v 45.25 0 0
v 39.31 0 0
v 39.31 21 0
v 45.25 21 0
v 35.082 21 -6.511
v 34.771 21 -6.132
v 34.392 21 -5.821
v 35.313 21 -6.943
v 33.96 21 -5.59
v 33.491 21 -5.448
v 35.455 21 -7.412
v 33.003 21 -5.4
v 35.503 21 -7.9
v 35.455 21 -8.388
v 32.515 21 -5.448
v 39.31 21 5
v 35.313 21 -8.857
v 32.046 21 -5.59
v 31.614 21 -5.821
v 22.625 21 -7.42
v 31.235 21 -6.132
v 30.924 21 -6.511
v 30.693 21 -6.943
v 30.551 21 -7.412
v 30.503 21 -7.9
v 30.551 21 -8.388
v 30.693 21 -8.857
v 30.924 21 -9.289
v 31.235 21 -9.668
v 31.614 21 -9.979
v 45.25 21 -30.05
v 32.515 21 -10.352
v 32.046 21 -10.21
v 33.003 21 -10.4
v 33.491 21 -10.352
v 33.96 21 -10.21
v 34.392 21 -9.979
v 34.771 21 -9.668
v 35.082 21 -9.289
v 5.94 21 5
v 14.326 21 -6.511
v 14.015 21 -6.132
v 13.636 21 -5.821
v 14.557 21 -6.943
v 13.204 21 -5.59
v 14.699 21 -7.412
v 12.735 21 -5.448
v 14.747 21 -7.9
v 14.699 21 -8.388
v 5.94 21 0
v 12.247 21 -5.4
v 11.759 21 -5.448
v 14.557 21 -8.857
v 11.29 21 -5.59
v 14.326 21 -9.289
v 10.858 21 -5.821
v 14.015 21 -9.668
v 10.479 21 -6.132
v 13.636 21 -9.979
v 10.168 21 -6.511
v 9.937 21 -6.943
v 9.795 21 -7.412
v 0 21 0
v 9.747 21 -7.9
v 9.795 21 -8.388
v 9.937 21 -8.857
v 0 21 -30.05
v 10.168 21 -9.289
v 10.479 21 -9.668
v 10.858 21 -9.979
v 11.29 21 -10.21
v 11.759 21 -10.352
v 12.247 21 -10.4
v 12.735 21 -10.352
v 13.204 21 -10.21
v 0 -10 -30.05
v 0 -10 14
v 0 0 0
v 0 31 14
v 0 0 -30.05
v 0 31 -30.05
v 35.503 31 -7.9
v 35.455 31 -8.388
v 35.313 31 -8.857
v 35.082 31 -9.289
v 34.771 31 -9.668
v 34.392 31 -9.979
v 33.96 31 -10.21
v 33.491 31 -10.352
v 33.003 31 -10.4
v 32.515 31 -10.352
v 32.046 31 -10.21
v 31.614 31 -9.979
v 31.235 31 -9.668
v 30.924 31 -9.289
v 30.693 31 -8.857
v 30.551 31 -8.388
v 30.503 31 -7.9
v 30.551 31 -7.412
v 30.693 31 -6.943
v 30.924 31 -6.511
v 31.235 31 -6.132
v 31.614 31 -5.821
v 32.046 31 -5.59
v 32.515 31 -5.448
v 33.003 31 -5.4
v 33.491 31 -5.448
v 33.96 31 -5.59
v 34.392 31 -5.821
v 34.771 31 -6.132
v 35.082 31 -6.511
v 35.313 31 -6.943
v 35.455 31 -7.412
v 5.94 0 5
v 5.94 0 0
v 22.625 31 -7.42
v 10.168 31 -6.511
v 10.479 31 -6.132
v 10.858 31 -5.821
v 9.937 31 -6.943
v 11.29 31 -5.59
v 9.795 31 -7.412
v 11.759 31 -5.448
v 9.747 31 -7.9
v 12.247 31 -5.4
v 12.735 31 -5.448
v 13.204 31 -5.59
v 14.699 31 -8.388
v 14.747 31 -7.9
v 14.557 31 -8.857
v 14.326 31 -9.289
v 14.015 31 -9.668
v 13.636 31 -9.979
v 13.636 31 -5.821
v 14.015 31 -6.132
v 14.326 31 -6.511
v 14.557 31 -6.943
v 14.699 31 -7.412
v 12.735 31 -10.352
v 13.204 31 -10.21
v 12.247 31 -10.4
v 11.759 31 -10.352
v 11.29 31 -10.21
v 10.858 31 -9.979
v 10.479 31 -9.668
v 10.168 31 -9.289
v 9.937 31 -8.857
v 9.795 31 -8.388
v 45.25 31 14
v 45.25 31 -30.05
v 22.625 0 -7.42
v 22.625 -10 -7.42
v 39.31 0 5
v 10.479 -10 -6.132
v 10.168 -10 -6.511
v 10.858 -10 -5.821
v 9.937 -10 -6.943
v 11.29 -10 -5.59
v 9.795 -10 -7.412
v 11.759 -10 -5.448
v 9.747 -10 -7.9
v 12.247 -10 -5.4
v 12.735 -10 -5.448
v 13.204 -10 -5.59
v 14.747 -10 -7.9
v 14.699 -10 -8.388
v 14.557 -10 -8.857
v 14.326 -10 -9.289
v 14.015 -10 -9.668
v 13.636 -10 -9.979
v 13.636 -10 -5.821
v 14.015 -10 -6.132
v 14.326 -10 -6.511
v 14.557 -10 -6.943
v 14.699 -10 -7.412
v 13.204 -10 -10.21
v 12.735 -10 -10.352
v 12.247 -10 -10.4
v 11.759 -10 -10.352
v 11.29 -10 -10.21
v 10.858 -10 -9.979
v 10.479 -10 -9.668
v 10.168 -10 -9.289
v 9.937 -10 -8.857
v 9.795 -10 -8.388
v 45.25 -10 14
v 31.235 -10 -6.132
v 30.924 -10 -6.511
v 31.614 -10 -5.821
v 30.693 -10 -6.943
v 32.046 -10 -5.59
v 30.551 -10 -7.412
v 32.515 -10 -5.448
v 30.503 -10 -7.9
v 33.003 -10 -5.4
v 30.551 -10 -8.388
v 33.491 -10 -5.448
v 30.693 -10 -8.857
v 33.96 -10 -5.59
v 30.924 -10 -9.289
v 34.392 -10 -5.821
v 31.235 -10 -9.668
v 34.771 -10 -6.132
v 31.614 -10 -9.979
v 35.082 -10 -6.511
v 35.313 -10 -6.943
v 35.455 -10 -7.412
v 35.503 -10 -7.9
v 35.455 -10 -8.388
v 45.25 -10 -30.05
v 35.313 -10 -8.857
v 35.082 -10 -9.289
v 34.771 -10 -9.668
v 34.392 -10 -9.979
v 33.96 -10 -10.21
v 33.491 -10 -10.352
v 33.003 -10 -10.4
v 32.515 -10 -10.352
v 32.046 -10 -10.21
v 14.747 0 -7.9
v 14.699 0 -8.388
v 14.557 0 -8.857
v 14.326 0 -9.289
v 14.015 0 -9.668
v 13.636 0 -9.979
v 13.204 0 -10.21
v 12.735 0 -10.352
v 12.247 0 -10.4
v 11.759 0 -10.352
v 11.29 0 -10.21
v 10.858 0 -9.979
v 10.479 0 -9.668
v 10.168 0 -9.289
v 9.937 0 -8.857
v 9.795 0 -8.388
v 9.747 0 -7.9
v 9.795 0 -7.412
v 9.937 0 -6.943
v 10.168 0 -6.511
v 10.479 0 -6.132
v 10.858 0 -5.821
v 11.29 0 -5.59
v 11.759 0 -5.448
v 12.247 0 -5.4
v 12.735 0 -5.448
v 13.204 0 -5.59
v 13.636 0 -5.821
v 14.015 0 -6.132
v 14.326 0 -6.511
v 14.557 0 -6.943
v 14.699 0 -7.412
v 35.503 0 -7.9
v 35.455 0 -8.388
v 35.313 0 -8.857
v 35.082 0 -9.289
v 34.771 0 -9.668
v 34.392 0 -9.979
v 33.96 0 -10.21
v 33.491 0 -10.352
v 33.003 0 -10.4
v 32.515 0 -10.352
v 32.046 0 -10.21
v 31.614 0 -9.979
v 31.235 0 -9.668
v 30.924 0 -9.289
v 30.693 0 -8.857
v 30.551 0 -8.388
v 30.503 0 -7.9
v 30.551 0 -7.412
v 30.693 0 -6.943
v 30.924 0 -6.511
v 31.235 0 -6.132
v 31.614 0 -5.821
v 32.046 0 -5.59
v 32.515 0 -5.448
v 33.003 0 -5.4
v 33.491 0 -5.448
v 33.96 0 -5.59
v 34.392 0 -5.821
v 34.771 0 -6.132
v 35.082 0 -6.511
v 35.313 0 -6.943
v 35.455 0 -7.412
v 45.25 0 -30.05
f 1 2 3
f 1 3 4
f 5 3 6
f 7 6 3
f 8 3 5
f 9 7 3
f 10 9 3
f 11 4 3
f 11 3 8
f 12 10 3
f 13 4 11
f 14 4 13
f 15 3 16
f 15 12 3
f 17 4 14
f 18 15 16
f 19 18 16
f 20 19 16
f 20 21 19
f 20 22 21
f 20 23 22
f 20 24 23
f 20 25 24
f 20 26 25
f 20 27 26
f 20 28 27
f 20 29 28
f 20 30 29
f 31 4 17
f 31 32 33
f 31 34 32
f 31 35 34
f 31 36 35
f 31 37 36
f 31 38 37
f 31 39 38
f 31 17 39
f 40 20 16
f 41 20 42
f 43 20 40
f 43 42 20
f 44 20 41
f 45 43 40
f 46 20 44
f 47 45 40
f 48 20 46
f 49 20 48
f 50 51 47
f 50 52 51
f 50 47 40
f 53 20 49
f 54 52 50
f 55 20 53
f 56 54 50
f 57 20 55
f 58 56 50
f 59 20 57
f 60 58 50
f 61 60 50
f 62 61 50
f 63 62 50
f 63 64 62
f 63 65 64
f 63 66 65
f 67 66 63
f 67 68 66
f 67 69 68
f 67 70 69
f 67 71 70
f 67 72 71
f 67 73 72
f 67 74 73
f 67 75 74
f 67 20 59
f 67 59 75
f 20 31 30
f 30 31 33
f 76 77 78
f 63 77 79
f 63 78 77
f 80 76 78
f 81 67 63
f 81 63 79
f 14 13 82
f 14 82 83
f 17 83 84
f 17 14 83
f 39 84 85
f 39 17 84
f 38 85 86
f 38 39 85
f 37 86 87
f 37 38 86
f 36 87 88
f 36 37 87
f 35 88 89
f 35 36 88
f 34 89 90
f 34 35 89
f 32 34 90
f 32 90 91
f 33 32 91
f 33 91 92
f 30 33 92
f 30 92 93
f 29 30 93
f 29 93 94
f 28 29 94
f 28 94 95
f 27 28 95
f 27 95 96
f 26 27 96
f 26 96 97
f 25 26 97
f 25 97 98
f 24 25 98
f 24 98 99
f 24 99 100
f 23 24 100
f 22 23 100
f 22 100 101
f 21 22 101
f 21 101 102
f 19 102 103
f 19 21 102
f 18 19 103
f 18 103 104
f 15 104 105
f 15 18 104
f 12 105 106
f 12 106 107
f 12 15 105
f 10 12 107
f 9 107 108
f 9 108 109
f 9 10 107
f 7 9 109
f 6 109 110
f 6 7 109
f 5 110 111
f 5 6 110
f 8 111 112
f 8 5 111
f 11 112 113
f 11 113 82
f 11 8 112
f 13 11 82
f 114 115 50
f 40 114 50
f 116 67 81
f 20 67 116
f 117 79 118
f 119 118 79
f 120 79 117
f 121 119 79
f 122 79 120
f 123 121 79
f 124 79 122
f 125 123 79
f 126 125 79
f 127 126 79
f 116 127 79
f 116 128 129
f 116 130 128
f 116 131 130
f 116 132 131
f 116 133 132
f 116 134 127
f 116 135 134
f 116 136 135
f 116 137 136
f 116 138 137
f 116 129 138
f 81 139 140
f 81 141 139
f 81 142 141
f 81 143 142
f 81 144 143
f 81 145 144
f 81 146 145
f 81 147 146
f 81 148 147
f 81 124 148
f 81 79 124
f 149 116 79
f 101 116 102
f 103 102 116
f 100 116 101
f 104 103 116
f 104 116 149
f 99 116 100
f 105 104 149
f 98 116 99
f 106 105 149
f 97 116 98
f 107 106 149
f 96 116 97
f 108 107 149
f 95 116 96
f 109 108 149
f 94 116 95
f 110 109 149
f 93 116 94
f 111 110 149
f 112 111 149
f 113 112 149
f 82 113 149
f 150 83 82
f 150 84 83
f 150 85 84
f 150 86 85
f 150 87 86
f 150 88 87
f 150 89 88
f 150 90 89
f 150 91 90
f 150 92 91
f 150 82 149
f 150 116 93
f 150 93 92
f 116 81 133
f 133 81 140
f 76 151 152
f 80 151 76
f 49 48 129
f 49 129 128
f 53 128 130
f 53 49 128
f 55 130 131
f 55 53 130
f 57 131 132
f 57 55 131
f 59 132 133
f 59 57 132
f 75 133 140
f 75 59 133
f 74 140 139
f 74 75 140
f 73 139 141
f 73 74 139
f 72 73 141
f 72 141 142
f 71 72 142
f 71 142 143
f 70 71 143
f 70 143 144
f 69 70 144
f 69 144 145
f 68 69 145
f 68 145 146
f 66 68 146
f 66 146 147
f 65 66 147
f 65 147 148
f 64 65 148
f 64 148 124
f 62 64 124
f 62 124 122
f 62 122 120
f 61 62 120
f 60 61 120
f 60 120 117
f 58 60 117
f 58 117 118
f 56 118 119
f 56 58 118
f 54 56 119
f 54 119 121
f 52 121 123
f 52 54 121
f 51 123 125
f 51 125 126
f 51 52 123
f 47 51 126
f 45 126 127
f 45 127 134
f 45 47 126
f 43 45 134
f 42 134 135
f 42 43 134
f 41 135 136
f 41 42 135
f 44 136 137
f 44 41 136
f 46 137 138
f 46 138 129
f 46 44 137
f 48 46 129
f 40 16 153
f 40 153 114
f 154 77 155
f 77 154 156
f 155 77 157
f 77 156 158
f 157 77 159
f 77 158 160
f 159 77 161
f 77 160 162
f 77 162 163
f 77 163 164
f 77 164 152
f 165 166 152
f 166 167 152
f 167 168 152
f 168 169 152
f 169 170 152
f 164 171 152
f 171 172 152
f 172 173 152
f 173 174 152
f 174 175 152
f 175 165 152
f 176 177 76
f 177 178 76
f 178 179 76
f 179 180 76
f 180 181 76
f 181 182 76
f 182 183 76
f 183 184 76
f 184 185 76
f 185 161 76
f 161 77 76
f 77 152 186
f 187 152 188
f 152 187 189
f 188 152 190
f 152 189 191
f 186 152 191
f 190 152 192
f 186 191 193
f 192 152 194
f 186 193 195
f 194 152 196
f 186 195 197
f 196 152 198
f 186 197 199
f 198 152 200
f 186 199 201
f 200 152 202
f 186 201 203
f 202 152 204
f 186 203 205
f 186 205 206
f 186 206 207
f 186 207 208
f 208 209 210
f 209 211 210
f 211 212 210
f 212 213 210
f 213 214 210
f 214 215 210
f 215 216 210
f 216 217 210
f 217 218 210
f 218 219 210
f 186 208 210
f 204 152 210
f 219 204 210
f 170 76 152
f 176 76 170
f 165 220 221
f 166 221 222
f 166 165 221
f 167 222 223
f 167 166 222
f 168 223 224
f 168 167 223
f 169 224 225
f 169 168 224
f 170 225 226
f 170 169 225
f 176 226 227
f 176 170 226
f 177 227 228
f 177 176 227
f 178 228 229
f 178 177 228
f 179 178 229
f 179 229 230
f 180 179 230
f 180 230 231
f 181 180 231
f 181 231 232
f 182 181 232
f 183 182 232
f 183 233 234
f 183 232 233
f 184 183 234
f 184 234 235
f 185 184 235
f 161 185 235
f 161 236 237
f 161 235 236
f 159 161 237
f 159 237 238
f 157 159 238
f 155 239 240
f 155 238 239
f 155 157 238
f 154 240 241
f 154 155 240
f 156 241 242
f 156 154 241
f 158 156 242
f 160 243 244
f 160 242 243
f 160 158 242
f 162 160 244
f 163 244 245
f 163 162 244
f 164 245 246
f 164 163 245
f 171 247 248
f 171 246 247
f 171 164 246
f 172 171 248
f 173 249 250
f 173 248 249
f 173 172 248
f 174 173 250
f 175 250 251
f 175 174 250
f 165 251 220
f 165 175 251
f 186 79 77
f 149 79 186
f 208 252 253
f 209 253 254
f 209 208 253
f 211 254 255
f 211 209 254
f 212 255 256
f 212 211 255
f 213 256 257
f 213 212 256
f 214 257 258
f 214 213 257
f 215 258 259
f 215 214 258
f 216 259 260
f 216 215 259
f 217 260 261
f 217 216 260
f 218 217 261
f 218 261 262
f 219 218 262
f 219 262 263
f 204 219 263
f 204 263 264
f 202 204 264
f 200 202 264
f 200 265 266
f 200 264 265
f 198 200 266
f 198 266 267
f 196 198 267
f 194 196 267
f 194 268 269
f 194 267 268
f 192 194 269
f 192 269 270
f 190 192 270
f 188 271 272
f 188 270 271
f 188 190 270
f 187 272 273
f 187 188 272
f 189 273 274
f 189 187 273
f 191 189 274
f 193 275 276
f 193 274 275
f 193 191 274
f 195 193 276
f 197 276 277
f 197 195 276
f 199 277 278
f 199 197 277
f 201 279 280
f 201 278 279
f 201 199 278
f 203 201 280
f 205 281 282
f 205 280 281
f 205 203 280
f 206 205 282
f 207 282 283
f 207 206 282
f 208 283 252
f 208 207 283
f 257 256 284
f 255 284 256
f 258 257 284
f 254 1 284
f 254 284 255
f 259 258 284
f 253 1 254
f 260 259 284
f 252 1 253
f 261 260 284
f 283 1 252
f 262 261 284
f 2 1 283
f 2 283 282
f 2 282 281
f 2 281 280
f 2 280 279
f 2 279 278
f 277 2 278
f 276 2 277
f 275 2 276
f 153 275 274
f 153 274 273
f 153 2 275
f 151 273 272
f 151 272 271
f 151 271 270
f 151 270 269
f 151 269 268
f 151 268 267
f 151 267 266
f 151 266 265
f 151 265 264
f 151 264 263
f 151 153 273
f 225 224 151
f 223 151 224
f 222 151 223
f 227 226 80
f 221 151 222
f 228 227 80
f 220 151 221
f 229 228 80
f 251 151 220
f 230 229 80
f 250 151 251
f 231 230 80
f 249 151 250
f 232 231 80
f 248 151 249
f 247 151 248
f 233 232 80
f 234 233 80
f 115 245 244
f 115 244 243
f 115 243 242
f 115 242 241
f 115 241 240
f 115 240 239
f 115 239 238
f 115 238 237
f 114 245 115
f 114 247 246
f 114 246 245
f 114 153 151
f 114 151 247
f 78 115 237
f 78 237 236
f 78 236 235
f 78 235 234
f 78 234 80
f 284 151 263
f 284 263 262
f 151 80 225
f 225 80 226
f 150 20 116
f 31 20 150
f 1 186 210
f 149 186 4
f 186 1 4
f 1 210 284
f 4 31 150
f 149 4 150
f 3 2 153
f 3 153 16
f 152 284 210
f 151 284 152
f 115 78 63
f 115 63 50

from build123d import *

# Parameters (mm, degrees)
SKETCH1_W           = 45.25
SKETCH1_H           = 21
BOSS_EXTRUDE1_DEPTH = 8
BOSS_EXTRUDE3_DEPTH = 10
BOSS_EXTRUDE4_DEPTH = 10
SKETCH5_W           = 45.25
SKETCH5_H           = 8
BOSS_EXTRUDE5_DEPTH = 10
SKETCH6_W           = 45.25
SKETCH6_H           = 8
BOSS_EXTRUDE6_DEPTH = 10
SKETCH7_W           = 33.369667902
SKETCH7_H           = 21
CUT_EXTRUDE1_DEPTH  = 5
SKETCH8_W           = 45.25
SKETCH8_H           = 41
BOSS_EXTRUDE7_DEPTH = 6
HOLE1_START         = -10
HOLE1_OUTLINE_R     = 2.5
HOLE1_DEPTH         = 41
HOLE2_START         = -10
HOLE2_OUTLINE_R     = 2.5
HOLE2_DEPTH         = 41


# Read off the part's stored shape, not the designer's step: Hole1, Hole2
with BuildPart() as part:
    # Sketch1 → Boss-Extrude1 (new body)
    with BuildSketch(Plane.XY):
        with Locations((22.625, 10.5)):
            Rectangle(SKETCH1_W, SKETCH1_H)
    extrude(amount=BOSS_EXTRUDE1_DEPTH)



with BuildPart() as body_2:
    # Sketch3 → Boss-Extrude3 (new body)
    with BuildSketch(Plane(origin=(0, 21, 0), x_dir=(1, 0, 0), z_dir=(0, 1, 0))):
        Polygon((45.25, 0), (0, 0), (0, 30.05), (22.625, 7.420166262), (45.25, 30.05), align=None)
    extrude(amount=BOSS_EXTRUDE3_DEPTH)


with BuildPart() as body_3:
    # Sketch4 → Boss-Extrude4 (new body)
    with BuildSketch(Plane.XZ):
        Polygon((0, 0), (45.25, 0), (45.25, -30.05), (22.625, -7.420166262), (0, -30.05), align=None)
    extrude(amount=BOSS_EXTRUDE4_DEPTH)


with BuildPart() as part_1:
    add(part.part)

    add(body_2.part)  # Boss-Extrude5 merges body 2
    # Sketch5 → Boss-Extrude5 (add)
    with BuildSketch(Plane(origin=(0, 21, 0), x_dir=(1, 0, 0), z_dir=(0, 1, 0))):
        with Locations((22.625, -4)):
            Rectangle(SKETCH5_W, SKETCH5_H)
    extrude(amount=BOSS_EXTRUDE5_DEPTH)


    add(body_3.part)  # Boss-Extrude6 merges body 3
    # Sketch6 → Boss-Extrude6 (add)
    with BuildSketch(Plane.XZ):
        with Locations((22.625, 4)):
            Rectangle(SKETCH6_W, SKETCH6_H)
    extrude(amount=BOSS_EXTRUDE6_DEPTH)

    # Sketch7 → Cut-Extrude1 (cut)
    with BuildSketch(Plane(origin=(0, 0, 0), x_dir=(-1, 0, 0), z_dir=(0, 0, -1))):
        with Locations((-22.625, 10.5)):
            Rectangle(SKETCH7_W, SKETCH7_H)
    extrude(amount=-CUT_EXTRUDE1_DEPTH, mode=Mode.SUBTRACT)

    # Sketch8 → Boss-Extrude7 (add)
    with BuildSketch(Plane.XY.offset(8)):
        with Locations((22.625, 10.5)):
            Rectangle(SKETCH8_W, SKETCH8_H)
    extrude(amount=BOSS_EXTRUDE7_DEPTH)

    # Hole1 outline → Hole1 (cut)
    with BuildSketch(Plane(origin=(0, 0, 0), x_dir=(1, 0, 0), z_dir=(0, 1, 0)).offset(HOLE1_START)):
        with Locations((33.003168971, 7.9)):
            Circle(HOLE1_OUTLINE_R)
    extrude(amount=HOLE1_DEPTH, mode=Mode.SUBTRACT)

    # Hole2 outline → Hole2 (cut)
    with BuildSketch(Plane(origin=(0, 0, 0), x_dir=(1, 0, 0), z_dir=(0, 1, 0)).offset(HOLE2_START)):
        with Locations((12.246831029, 7.9)):
            Circle(HOLE2_OUTLINE_R)
    extrude(amount=HOLE2_DEPTH, mode=Mode.SUBTRACT)


solid = part_1.part
